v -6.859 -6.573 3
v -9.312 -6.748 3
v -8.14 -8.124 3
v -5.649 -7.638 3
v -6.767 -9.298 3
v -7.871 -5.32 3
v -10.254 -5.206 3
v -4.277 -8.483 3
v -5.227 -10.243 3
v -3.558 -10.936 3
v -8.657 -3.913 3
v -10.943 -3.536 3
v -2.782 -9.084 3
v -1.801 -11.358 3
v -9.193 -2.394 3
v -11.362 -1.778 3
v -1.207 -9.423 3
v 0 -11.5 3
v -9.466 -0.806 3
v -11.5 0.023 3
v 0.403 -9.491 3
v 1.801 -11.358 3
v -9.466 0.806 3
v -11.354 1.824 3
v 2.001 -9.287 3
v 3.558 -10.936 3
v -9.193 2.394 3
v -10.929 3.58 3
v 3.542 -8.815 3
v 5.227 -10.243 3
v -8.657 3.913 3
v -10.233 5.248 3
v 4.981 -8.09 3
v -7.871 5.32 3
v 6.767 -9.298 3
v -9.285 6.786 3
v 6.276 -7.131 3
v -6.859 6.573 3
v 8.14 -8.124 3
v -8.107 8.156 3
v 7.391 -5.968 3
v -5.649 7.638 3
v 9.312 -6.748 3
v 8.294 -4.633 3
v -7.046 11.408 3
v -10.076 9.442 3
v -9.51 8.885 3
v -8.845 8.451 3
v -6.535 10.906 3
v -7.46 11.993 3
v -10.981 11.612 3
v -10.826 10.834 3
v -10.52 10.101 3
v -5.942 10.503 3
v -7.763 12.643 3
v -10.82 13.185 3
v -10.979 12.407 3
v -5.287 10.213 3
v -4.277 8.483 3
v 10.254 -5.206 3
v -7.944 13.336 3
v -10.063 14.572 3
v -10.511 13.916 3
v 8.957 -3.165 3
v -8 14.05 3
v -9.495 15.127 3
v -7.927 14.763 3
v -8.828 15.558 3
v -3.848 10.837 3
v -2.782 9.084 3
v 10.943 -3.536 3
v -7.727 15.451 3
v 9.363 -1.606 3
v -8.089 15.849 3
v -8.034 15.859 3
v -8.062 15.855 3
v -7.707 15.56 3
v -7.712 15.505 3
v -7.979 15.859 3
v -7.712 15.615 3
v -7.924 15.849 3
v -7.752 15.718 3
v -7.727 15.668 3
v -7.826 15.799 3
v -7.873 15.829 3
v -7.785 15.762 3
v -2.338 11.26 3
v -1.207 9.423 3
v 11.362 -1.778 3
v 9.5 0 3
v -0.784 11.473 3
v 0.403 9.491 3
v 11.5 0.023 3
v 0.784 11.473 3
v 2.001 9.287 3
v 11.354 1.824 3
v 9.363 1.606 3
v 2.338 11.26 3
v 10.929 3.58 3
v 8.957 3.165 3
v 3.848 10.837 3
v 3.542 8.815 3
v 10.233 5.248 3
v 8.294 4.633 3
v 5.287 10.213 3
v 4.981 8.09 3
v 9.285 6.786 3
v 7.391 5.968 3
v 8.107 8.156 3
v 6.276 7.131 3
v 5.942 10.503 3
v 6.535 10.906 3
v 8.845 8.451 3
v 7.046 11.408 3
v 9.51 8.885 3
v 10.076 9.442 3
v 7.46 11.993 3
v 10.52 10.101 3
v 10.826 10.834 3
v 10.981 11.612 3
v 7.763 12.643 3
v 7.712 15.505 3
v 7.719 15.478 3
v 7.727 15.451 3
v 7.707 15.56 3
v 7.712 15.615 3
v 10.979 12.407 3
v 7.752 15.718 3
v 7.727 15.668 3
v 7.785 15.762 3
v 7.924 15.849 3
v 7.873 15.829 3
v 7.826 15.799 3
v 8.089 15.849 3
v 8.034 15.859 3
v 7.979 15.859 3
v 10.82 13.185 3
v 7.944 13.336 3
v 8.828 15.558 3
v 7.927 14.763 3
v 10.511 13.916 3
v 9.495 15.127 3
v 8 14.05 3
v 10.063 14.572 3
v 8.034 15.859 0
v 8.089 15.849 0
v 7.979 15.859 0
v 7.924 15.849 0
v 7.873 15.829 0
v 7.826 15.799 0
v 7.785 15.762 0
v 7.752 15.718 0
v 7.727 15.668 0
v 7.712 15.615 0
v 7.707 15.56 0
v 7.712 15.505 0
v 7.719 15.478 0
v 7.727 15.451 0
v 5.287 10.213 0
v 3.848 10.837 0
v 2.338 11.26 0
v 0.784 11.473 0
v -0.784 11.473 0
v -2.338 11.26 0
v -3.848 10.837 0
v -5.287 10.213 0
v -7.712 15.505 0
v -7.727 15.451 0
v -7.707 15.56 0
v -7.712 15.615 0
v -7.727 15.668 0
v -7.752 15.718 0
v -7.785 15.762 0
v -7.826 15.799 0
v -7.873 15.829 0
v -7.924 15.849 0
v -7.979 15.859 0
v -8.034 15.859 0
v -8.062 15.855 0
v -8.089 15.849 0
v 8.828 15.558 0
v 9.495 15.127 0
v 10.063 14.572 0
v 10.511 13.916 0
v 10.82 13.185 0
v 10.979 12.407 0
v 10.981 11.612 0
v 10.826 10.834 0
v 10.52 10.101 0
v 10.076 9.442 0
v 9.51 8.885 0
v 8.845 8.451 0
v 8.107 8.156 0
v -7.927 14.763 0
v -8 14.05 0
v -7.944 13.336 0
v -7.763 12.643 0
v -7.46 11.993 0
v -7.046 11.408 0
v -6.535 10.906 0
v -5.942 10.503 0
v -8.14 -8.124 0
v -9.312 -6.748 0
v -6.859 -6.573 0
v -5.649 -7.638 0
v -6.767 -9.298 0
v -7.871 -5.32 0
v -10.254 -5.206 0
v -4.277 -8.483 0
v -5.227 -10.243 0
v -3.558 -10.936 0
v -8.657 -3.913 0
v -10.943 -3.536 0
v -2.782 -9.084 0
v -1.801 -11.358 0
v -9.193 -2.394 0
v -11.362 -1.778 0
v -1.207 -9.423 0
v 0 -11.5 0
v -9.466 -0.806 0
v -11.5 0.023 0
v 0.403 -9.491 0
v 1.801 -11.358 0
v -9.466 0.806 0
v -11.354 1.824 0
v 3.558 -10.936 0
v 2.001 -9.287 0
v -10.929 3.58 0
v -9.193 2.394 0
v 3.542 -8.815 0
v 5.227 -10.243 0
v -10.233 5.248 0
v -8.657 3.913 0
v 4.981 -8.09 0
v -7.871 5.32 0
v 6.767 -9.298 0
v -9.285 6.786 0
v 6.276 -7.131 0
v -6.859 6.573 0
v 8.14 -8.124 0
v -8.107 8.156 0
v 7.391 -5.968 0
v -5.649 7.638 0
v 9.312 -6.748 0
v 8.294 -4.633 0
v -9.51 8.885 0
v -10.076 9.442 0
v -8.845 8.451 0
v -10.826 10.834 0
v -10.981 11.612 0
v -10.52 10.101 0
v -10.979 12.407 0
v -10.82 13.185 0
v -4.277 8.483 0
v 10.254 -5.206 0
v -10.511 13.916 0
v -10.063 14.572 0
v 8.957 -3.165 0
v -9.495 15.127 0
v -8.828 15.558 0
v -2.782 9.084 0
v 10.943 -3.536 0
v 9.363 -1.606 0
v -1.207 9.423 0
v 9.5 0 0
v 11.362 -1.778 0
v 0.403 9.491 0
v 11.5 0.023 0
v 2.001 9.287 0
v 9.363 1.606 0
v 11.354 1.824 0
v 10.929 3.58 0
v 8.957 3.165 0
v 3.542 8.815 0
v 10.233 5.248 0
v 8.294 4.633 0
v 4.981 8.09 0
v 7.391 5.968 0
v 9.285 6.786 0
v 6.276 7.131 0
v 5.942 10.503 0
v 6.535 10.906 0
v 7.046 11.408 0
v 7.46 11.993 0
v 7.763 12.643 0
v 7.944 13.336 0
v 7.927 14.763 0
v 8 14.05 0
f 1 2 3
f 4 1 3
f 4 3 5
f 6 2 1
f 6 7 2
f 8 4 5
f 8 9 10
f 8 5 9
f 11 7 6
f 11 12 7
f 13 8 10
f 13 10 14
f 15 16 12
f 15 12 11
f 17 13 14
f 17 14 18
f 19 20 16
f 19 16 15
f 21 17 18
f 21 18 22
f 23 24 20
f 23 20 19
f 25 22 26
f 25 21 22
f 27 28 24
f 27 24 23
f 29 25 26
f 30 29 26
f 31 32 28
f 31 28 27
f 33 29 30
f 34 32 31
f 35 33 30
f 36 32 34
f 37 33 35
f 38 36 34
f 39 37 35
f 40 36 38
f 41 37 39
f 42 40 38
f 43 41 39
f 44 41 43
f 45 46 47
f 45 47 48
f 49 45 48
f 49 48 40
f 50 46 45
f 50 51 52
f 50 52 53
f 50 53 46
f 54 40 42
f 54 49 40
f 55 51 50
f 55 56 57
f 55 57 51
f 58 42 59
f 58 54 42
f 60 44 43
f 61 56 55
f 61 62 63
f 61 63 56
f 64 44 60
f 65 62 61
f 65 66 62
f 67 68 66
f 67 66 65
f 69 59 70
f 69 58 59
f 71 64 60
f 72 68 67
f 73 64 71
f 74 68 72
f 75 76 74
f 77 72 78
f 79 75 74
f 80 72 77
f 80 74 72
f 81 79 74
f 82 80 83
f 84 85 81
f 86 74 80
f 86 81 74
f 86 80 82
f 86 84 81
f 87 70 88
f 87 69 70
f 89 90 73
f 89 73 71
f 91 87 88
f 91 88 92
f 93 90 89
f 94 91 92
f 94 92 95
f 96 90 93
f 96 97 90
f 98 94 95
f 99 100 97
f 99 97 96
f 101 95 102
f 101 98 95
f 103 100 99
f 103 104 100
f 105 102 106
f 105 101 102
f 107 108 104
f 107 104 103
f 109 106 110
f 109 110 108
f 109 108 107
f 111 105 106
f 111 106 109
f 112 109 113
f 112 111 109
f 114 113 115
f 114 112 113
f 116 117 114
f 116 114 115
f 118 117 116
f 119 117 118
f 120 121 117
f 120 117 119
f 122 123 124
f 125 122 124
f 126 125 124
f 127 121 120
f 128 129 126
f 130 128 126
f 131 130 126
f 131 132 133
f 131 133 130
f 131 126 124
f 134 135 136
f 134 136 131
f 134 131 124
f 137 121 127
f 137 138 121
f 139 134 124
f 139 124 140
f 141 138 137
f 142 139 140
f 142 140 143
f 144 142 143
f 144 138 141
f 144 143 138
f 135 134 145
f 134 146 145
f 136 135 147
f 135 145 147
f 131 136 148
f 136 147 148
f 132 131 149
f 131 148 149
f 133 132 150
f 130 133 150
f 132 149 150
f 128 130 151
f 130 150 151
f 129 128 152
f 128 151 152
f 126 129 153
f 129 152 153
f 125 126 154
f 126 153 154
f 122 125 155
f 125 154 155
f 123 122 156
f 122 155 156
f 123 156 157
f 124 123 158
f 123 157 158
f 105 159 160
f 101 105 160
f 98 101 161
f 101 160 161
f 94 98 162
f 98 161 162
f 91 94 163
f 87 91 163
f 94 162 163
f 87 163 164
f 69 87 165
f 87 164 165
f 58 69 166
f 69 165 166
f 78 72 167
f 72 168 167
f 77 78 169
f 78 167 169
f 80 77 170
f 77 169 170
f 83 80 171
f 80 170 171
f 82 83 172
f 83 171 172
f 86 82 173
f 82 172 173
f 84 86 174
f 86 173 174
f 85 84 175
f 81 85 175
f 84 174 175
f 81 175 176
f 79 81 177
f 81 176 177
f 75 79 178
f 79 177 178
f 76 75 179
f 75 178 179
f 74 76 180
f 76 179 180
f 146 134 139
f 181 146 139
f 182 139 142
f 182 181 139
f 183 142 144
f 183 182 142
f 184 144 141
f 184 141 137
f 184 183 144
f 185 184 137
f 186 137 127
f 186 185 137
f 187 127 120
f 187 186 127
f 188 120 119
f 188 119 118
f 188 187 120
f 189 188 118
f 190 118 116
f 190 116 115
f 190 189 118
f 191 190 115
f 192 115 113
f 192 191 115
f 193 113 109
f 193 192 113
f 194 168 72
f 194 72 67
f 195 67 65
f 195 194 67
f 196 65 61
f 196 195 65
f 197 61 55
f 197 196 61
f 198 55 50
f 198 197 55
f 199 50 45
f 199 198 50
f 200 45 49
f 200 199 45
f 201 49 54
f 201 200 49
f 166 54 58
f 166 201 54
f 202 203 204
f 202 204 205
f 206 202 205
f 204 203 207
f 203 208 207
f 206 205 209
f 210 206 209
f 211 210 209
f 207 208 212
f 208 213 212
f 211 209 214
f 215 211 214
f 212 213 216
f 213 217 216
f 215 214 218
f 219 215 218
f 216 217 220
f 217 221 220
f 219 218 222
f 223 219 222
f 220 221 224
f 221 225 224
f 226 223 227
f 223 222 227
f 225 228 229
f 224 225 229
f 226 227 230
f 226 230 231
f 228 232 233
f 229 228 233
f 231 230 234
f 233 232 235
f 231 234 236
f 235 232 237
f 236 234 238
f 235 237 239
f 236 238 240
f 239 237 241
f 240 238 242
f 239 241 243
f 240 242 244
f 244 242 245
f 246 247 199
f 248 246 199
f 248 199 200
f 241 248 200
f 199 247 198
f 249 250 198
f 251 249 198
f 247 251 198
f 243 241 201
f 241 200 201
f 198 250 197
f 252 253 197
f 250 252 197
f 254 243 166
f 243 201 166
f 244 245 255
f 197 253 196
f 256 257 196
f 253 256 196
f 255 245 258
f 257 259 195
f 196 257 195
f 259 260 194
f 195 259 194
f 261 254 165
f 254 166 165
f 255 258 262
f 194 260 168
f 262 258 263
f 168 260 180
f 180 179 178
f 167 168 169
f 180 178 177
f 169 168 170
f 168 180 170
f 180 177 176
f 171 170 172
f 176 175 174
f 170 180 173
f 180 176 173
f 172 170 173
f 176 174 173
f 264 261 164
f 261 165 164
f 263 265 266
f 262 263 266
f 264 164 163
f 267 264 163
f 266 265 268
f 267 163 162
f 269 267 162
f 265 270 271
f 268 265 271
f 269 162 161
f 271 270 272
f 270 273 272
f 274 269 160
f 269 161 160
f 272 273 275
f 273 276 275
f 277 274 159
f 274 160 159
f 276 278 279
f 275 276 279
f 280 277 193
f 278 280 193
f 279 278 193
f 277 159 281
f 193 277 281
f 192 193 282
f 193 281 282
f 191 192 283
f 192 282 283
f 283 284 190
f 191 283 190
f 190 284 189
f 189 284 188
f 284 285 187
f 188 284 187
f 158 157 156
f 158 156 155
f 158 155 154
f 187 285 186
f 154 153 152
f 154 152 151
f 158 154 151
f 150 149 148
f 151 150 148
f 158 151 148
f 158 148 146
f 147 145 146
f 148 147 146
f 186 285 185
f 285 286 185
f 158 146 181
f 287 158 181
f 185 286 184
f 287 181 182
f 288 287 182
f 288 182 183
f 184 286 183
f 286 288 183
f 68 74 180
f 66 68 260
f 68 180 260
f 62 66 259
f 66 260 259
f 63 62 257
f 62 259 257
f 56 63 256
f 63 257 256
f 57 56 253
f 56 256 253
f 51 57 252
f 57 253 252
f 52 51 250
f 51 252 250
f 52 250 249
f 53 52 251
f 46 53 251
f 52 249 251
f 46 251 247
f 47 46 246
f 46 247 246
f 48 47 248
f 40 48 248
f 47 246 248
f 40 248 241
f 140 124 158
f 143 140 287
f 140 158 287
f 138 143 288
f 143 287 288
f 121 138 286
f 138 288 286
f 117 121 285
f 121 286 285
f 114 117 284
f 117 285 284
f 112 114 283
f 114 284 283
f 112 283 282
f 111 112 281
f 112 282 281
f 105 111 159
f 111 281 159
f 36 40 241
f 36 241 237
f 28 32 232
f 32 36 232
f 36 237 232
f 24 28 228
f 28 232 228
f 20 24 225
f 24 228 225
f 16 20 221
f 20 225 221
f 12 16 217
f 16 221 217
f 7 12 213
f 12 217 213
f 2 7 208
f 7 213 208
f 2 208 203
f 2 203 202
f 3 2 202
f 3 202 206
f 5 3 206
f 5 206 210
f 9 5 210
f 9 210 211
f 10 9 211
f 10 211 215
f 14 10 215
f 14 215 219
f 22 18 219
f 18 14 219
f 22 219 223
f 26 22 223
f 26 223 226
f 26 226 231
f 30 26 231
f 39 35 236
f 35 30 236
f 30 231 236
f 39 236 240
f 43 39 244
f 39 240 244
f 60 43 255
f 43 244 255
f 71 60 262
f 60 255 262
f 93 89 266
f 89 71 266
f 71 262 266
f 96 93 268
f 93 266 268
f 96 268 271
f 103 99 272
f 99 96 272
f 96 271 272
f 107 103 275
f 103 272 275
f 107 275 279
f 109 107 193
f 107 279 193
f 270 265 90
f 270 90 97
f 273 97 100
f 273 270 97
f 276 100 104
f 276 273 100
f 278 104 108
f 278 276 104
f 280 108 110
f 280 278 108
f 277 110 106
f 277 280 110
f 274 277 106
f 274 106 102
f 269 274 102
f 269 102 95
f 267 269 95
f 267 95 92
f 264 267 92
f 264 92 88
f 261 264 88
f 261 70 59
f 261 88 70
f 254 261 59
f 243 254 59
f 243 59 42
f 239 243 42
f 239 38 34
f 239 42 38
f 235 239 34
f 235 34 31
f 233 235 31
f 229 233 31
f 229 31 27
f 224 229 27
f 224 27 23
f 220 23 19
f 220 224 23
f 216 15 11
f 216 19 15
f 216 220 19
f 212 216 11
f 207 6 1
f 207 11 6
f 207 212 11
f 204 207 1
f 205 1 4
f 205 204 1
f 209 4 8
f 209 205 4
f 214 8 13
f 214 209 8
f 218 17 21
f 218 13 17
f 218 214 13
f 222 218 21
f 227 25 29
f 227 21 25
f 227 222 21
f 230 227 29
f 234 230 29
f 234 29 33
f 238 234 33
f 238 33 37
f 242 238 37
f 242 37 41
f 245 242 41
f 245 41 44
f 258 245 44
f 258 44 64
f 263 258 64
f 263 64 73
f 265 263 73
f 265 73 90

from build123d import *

# Parameters (mm, degrees)
CYLINDER003_R     = 4
CYLINDER003_DEPTH = 3
CYLINDER002_R     = 4
CYLINDER002_DEPTH = 3
CYLINDER001_R     = 9.5
CYLINDER001_DEPTH = 10
CYLINDER_R        = 11.5
CYLINDER_DEPTH    = 3
FILLET_R          = 0.3


with BuildPart() as cilindro003:
    # Cylinder003 → Cylinder003 (new body)
    with BuildSketch(Plane(origin=(3, 2, 0), x_dir=(1, 0, 0), z_dir=(0, 0, 1))):
        Circle(CYLINDER003_R)
    extrude(amount=CYLINDER003_DEPTH)


with BuildPart() as cilindro002:
    # Cylinder002 → Cylinder002 (new body)
    with BuildSketch(Plane.XY):
        Circle(CYLINDER002_R)
    extrude(amount=CYLINDER002_DEPTH)


with BuildPart() as cut001:
    # Cut001 base: copy of Cilindro002
    add(cilindro002.part)

    # Cut001: cut Cilindro003
    add(cilindro003.part, mode=Mode.SUBTRACT)


with BuildPart() as cut001_1:
    # Cut001 placement: moved
    add(cut001.part.moved(Location((-7, 11, 0))))


with BuildPart() as cuerno_decho:
    # Part__Mirroring: instance of Cut001
    add(cut001_1.part.mirror(Plane(origin=(0, 0, 0), x_dir=(0, -1, 0), z_dir=(1, 0, 0))))


with BuildPart() as cuerno_decho_1:
    # Part__Mirroring placement: moved
    add(cuerno_decho.part.moved(Location((0, 1, 0))))


with BuildPart() as cilindro_interior:
    # Cylinder001 → Cylinder001 (new body)
    with BuildSketch(Plane.XY.offset(-3)):
        Circle(CYLINDER001_R)
    extrude(amount=CYLINDER001_DEPTH)


with BuildPart() as cuerpo_anillo:
    # Cylinder → Cylinder (new body)
    with BuildSketch(Plane.XY):
        Circle(CYLINDER_R)
    extrude(amount=CYLINDER_DEPTH)

    # Cut: cut cilindro-interior
    add(cilindro_interior.part, mode=Mode.SUBTRACT)


with BuildPart() as anillo_final:
    # Cut002 base: copy of Cilindro002
    add(cilindro002.part)

    # Cut002: cut Cilindro003
    add(cilindro003.part, mode=Mode.SUBTRACT)


with BuildPart() as anillo_final_1:
    # Cut002 placement: moved
    add(anillo_final.part.moved(Location((-7, 12, 0))))

    # Fusion: union Cuerno-decho, Cuerpo-anillo
    add(cuerno_decho_1.part)
    add(cuerpo_anillo.part)

    # Fillet
    fillet_edges = [anillo_final_1.edges().sort_by_distance(p)[0] for p in [
        (-7.480676, 15.971014, 1.5),
        (7.480676, 15.971014, 1.5),
    ]]
    fillet(fillet_edges, radius=FILLET_R)


solid = anillo_final_1.part
